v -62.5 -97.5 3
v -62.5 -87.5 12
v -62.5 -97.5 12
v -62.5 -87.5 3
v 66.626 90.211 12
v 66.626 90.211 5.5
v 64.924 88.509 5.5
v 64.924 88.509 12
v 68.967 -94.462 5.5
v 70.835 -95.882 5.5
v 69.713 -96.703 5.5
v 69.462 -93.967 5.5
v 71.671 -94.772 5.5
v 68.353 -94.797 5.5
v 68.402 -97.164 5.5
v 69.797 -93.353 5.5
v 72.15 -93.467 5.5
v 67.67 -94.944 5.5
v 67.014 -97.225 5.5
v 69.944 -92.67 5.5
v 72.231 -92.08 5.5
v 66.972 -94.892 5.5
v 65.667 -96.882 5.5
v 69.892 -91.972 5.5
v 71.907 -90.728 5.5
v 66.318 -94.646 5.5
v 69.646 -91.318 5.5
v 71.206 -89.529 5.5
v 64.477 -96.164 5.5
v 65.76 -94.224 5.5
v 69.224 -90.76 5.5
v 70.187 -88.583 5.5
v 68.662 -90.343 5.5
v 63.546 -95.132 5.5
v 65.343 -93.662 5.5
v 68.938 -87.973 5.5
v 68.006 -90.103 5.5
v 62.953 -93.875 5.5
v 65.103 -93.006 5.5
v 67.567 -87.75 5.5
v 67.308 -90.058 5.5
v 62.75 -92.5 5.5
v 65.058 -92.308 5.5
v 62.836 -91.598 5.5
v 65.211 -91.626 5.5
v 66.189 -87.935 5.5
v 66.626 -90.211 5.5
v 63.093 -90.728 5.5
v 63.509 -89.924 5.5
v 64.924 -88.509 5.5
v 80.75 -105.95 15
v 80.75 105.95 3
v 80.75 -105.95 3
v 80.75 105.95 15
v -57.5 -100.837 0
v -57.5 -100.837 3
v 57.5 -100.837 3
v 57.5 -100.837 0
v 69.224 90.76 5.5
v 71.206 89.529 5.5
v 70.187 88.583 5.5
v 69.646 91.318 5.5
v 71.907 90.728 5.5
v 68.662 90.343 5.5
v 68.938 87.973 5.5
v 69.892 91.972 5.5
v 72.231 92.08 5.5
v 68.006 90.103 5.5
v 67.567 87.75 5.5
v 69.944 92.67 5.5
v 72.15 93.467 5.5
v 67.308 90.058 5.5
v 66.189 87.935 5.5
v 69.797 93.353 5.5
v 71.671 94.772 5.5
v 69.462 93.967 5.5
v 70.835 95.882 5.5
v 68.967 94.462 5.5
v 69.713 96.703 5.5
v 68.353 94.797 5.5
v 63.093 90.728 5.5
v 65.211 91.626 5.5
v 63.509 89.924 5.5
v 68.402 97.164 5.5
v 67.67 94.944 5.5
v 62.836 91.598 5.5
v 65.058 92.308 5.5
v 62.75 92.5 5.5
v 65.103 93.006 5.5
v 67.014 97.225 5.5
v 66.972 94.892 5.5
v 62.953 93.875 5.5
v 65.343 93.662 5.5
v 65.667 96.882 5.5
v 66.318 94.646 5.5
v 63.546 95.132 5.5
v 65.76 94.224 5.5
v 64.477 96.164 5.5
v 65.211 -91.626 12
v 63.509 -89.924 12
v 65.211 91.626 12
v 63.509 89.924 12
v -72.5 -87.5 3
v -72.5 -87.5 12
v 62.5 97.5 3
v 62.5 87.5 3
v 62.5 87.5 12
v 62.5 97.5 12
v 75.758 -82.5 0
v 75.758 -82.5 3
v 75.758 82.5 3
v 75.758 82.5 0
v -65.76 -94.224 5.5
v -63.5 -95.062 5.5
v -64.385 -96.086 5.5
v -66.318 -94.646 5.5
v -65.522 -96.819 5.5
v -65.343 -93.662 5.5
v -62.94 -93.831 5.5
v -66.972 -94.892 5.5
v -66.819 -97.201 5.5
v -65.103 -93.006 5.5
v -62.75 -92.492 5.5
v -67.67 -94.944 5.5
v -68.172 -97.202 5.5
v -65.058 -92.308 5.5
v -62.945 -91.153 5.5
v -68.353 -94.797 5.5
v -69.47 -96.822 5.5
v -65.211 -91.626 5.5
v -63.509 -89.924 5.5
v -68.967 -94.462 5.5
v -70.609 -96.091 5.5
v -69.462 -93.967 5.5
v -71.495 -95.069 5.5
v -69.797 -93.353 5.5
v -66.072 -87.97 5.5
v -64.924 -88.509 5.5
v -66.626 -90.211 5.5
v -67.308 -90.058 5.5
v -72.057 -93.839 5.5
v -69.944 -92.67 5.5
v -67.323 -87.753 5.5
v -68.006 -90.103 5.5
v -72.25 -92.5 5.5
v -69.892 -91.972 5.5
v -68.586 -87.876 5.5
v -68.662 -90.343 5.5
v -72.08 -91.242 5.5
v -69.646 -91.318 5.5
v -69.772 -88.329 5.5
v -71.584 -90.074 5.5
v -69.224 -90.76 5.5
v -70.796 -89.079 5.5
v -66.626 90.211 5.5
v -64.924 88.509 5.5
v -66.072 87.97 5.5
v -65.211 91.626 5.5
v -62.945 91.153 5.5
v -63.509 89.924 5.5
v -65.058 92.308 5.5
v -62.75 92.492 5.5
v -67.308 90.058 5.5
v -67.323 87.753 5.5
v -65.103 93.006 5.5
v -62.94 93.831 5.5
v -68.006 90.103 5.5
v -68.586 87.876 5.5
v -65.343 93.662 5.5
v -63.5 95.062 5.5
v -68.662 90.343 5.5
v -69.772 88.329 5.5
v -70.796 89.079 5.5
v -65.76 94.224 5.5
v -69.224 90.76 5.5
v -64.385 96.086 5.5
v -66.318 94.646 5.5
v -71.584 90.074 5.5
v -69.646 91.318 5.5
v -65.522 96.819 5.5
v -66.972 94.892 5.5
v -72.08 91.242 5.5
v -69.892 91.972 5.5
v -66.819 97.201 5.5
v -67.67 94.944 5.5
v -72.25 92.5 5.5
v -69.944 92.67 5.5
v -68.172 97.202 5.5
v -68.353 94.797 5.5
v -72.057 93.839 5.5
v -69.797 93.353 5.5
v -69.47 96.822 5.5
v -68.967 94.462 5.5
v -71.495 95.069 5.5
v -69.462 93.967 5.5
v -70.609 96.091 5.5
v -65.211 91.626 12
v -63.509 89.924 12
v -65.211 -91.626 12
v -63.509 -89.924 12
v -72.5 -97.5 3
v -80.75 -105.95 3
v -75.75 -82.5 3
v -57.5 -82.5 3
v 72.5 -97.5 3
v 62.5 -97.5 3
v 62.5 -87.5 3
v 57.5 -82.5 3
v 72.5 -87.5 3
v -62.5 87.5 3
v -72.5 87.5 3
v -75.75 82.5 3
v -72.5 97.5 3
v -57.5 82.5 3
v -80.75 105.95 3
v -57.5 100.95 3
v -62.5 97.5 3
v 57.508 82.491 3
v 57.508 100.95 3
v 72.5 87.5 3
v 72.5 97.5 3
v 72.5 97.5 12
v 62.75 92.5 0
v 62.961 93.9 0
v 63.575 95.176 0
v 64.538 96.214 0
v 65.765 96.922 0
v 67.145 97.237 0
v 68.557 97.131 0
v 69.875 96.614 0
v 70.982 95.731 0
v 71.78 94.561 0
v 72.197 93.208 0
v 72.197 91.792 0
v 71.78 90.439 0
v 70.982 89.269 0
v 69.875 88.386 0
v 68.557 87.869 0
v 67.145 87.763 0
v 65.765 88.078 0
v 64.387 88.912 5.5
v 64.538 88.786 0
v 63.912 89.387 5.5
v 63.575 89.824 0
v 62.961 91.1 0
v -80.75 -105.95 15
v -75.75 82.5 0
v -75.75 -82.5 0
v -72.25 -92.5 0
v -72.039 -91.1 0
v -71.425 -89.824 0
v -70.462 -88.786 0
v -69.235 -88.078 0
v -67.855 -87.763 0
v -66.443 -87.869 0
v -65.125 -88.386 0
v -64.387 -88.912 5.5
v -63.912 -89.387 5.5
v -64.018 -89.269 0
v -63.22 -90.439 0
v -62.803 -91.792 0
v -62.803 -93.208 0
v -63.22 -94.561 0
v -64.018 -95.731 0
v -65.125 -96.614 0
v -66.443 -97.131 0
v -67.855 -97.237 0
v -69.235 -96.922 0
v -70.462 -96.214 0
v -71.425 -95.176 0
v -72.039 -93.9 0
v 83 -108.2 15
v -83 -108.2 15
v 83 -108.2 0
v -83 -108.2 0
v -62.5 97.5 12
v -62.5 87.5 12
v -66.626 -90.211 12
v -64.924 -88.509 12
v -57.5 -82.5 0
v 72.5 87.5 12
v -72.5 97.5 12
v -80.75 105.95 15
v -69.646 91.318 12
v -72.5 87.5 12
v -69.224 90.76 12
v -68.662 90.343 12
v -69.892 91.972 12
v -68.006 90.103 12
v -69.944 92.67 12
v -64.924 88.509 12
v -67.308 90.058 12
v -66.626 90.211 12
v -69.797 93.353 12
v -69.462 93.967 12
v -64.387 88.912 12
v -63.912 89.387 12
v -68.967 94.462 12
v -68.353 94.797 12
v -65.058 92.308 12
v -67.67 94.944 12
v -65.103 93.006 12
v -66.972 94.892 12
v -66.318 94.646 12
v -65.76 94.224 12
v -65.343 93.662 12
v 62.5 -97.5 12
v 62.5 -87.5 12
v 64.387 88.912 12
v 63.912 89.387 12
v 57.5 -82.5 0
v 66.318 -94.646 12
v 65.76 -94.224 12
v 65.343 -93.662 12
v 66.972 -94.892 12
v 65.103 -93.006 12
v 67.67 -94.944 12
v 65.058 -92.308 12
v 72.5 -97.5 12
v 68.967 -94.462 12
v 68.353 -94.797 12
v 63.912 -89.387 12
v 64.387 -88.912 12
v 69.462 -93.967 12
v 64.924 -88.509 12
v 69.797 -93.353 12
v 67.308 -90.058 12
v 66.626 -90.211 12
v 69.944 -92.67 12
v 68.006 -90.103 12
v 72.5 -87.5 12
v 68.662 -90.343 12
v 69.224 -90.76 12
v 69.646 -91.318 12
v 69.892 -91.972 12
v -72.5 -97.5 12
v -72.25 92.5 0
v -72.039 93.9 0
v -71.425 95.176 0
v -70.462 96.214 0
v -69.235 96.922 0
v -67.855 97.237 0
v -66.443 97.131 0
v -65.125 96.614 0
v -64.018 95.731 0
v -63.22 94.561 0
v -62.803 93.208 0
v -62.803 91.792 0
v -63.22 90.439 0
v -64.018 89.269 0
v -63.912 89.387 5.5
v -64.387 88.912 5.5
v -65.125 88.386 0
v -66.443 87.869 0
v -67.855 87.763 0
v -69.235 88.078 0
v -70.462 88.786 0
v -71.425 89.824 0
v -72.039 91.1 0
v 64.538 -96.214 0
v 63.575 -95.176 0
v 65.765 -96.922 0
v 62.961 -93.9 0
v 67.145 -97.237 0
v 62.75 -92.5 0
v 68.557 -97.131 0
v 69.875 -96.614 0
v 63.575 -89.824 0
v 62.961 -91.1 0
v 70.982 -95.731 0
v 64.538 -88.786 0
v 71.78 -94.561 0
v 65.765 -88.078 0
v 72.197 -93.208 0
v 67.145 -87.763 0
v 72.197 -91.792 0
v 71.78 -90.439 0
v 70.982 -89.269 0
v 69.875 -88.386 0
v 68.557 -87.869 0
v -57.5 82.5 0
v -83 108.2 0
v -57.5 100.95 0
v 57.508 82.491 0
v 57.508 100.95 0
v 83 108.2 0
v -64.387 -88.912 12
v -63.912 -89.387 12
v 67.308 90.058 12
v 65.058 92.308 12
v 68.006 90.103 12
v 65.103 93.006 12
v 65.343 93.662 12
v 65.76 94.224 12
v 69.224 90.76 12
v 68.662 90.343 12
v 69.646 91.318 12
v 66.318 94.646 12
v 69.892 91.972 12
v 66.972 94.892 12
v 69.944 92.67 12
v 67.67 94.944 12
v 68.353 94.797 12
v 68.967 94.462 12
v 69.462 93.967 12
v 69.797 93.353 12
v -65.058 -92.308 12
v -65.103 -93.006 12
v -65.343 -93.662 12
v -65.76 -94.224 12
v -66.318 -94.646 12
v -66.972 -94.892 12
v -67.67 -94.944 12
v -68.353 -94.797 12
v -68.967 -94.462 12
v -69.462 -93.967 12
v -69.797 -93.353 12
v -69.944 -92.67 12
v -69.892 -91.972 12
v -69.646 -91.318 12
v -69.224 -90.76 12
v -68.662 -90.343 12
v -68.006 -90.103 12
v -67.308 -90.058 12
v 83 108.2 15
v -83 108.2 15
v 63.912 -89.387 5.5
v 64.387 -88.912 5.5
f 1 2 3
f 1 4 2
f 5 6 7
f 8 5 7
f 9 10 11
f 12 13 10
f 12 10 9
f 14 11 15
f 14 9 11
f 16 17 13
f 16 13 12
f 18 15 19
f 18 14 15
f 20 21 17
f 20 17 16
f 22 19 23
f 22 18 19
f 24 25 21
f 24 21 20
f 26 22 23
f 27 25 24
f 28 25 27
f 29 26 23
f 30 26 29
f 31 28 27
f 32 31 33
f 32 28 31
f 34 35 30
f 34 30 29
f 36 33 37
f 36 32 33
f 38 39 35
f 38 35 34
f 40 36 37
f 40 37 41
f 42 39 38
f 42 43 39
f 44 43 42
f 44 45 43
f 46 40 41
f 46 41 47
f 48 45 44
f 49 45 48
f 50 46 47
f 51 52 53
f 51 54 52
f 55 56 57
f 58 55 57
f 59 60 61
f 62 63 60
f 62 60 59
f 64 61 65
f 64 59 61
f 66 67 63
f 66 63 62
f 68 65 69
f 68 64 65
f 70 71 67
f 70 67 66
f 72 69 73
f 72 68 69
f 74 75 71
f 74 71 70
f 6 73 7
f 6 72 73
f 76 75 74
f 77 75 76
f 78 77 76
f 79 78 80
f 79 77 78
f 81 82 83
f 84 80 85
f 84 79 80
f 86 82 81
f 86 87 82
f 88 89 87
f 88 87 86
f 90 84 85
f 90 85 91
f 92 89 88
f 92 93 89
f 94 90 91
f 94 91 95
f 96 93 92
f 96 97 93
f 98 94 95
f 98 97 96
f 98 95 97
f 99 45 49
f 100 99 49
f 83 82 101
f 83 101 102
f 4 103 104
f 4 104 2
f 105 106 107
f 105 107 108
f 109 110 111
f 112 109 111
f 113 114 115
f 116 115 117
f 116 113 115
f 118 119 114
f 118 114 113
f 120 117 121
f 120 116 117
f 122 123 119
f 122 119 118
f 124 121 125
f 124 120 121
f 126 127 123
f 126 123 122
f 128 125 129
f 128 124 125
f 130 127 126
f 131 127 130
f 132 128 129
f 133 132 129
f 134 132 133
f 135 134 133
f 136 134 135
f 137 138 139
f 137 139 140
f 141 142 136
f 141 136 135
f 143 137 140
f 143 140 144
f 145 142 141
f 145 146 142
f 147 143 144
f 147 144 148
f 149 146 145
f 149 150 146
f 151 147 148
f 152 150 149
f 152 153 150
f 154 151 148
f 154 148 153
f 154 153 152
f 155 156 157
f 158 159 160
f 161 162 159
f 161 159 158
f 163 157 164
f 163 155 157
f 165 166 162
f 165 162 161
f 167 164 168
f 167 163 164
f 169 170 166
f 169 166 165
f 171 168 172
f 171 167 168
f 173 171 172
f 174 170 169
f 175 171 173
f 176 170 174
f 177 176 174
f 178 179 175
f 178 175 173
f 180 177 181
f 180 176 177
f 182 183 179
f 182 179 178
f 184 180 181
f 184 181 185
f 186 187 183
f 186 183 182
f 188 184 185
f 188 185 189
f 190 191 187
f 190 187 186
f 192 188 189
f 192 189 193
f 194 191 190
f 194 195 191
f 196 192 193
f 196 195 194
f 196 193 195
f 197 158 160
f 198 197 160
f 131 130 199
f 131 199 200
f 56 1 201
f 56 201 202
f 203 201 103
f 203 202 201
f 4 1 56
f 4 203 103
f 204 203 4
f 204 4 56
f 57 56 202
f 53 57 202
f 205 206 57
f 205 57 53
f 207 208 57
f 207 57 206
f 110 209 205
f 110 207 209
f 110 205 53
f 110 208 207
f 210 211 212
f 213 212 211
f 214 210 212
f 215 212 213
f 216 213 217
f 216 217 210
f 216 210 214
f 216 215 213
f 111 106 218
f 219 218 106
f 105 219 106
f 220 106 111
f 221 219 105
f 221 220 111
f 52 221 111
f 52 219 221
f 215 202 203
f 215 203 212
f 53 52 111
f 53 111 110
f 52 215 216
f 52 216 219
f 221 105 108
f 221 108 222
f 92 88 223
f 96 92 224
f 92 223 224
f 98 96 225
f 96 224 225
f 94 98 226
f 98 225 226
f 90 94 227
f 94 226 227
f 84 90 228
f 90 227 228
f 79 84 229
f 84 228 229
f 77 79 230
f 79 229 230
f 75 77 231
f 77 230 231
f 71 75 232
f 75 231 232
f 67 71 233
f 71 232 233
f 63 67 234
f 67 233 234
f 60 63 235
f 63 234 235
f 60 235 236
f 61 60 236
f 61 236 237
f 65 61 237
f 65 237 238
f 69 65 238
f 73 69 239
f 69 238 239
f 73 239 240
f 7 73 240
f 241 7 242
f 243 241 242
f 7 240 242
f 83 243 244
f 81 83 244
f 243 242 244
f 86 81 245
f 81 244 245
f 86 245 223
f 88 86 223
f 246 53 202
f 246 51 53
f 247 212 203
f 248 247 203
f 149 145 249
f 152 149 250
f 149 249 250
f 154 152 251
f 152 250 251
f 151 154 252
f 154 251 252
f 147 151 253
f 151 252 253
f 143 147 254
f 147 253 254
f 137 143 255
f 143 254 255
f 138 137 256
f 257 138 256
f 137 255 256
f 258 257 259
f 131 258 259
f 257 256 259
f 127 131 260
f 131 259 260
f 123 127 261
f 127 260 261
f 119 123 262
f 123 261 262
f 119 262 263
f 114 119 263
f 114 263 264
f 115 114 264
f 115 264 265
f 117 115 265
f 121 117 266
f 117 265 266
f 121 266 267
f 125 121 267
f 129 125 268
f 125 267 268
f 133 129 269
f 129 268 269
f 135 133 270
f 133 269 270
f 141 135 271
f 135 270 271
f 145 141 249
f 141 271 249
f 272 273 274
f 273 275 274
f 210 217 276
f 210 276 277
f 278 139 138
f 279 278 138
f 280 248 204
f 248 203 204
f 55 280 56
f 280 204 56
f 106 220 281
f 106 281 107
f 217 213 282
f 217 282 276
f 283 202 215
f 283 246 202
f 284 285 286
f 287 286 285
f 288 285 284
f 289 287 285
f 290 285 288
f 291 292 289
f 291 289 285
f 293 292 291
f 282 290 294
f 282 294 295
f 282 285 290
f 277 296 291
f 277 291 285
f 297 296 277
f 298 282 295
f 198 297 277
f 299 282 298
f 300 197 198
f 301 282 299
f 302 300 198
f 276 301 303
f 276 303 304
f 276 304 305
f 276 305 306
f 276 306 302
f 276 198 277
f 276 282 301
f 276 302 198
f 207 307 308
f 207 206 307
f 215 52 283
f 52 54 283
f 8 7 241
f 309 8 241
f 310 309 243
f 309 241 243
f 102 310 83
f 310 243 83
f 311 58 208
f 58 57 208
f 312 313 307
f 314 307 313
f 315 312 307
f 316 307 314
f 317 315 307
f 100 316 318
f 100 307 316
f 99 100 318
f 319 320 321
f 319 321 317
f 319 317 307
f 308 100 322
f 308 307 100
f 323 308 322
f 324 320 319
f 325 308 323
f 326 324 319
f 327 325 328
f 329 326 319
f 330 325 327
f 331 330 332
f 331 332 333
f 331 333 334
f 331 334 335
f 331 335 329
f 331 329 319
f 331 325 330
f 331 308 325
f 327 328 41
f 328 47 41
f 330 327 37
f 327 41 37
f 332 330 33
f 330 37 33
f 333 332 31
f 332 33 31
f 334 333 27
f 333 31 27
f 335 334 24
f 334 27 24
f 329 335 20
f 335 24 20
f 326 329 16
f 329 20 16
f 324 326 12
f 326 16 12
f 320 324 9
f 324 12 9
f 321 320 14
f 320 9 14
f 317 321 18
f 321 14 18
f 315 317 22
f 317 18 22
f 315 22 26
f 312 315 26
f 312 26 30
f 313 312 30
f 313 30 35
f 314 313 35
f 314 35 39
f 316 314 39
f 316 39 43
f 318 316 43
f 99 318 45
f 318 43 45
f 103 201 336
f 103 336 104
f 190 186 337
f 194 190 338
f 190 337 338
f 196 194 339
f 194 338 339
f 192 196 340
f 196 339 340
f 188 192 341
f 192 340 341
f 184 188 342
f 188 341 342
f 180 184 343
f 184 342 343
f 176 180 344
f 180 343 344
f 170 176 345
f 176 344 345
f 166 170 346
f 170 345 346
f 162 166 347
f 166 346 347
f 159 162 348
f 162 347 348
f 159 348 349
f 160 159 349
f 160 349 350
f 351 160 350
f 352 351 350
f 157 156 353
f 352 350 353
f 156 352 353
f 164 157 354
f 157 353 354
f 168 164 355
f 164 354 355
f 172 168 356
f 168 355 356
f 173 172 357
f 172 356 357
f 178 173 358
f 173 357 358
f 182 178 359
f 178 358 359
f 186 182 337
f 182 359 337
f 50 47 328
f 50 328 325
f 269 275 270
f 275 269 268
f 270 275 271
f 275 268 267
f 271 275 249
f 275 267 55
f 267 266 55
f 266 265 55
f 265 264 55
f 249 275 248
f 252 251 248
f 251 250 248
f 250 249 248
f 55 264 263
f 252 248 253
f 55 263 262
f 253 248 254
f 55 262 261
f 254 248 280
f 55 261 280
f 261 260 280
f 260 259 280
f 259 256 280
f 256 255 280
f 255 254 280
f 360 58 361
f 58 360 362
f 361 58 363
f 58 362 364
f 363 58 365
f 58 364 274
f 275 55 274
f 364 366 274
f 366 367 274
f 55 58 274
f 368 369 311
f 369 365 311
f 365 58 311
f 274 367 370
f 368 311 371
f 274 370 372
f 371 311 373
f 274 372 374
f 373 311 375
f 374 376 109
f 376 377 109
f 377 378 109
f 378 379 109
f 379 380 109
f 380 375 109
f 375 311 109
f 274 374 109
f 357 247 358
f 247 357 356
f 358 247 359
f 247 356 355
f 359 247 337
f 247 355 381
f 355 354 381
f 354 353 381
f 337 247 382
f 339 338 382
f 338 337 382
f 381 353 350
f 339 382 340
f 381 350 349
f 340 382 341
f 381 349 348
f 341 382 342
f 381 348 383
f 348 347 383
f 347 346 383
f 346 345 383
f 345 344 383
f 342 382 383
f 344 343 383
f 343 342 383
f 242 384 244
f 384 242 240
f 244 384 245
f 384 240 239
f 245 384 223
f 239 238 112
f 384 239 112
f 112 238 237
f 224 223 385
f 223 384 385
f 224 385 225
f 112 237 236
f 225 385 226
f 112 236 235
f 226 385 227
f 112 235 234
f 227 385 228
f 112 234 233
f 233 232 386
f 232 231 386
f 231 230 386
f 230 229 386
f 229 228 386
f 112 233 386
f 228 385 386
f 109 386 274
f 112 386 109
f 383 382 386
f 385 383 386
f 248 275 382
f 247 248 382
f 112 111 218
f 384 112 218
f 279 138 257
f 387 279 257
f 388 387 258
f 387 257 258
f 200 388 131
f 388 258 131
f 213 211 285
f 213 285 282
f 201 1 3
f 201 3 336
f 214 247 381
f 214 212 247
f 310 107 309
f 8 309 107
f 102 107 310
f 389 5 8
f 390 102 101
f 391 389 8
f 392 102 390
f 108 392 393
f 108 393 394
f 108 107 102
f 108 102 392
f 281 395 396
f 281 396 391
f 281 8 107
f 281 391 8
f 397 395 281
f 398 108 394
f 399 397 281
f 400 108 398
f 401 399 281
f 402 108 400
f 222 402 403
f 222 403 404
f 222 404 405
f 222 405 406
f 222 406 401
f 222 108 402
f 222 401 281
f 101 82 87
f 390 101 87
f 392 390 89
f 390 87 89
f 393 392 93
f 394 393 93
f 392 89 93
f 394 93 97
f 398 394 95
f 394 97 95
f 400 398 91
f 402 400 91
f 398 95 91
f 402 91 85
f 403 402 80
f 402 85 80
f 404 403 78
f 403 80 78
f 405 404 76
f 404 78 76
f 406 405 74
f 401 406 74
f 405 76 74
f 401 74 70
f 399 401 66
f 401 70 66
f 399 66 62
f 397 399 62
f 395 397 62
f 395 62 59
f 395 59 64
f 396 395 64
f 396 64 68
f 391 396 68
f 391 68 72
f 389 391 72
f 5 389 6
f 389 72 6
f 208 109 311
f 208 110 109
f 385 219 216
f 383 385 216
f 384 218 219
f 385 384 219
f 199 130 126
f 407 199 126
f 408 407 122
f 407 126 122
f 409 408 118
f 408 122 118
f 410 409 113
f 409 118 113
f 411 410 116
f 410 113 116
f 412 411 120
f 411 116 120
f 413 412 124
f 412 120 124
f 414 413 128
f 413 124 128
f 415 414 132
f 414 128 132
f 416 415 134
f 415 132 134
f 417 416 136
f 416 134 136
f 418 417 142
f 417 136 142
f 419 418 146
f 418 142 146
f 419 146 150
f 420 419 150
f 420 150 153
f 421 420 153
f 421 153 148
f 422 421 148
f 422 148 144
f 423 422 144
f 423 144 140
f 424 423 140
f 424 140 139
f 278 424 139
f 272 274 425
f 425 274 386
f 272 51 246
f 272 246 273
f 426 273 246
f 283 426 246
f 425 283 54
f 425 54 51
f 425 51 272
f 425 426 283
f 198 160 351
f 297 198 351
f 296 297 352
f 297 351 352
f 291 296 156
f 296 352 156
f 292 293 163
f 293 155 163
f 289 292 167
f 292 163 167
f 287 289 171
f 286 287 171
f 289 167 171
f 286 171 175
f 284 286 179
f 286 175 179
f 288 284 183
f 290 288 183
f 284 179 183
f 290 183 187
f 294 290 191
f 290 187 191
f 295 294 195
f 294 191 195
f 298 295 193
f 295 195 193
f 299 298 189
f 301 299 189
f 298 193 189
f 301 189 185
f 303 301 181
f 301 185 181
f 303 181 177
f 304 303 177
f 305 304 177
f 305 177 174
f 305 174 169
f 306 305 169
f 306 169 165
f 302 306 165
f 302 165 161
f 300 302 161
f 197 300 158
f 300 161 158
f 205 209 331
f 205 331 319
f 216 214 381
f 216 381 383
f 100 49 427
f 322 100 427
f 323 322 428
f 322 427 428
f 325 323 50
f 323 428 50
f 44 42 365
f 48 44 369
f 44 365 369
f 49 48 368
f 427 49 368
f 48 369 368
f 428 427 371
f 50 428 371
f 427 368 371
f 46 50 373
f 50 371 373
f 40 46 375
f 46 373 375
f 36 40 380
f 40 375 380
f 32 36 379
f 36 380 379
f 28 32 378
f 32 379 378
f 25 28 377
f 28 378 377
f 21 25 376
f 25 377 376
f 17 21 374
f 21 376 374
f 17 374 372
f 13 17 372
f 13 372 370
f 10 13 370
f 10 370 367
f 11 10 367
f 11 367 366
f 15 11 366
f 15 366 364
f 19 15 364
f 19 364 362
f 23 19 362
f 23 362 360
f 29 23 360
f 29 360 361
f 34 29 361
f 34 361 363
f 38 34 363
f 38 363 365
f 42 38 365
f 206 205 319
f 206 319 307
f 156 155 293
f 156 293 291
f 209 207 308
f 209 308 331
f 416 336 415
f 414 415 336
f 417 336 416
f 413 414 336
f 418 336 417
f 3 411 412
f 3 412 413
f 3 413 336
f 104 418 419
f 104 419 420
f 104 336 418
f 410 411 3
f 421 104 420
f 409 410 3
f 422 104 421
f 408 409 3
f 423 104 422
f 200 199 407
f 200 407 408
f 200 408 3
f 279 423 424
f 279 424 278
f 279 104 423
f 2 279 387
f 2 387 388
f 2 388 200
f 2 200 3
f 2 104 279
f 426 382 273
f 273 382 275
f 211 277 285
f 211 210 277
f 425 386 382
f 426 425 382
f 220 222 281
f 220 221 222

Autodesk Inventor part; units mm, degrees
ref_plane "YZ Plane" through (0, 0, 0) normal (1, 0, 0) x (0, 1, 0)
ref_plane "XZ Plane" through (0, 0, 0) normal (0, 1, 0) x (-1, 0, 0)
ref_plane "XY Plane" through (0, 0, 0) normal (0, 0, 1) x (1, 0, 0)
sketch "Boceto1" plane through (0, 0, 0) normal (0, 0, 1) x (1, 0, 0)
  line L0 (-83, -108.2) -> (83, -108.2)
  line L1 (83, -108.2) -> (83, 108.2)
  line L2 (83, 108.2) -> (-83, 108.2)
  line L3 (-83, 108.2) -> (-83, -108.2)
  line L4 (-83, -108.2) -> (83, 108.2) construction
  line L5 (83, -108.2) -> (-83, 108.2) construction
  point P0 (0, 0)
  dimension "d0" = 166
  dimension "d1" = 216.4
extrude "Extrusión1" add sketch "Boceto1" along normal blind 15
sketch "Boceto2" plane through (0, 0, 15) normal (0, 0, 1) x (1, 0, 0)
  line L0 (80.75, -105.95) -> (-80.75, -105.95)
  line L1 (-80.75, -105.95) -> (-80.75, 105.95)
  line L2 (80.75, 105.95) -> (-80.75, 105.95)
  line L3 (80.75, 105.95) -> (80.75, -105.95)
  line L4 (-83, 108.2) -> (83, 108.2)
  line L5 (83, 108.2) -> (83, -108.2)
  line L6 (83, -108.2) -> (-83, -108.2)
  line L7 (-83, -108.2) -> (-83, 108.2)
  point P0 (0, 0)
extrude "Extrusión2" cut sketch "Boceto2" against normal blind 12 contours L0 L1 L2 L3
sketch "Boceto3" plane through (0, 0, 3) normal (0, 0, 1) x (1, 0, 0)
  line L0 (-67.5, -92.5) -> (67.5, -92.5)
  line L1 (67.5, -92.5) -> (67.5, 92.5)
  line L2 (67.5, 92.5) -> (-67.5, 92.5)
  line L3 (-67.5, 92.5) -> (-67.5, -92.5)
  line L4 (-62.5, 87.5) -> (-72.5, 87.5)
  line L5 (-72.5, 87.5) -> (-72.5, 97.5)
  line L6 (-72.5, 97.5) -> (-62.5, 97.5)
  line L7 (-62.5, 97.5) -> (-62.5, 87.5)
  line L8 (-62.5, 87.5) -> (-72.5, 97.5) construction
  line L9 (-72.5, 87.5) -> (-62.5, 97.5) construction
  line L10 (72.5, 87.5) -> (62.5, 87.5)
  line L11 (62.5, 87.5) -> (62.5, 97.5)
  line L12 (62.5, 97.5) -> (72.5, 97.5)
  line L13 (72.5, 97.5) -> (72.5, 87.5)
  line L14 (72.5, 87.5) -> (62.5, 97.5) construction
  line L15 (62.5, 87.5) -> (72.5, 97.5) construction
  line L16 (72.5, -97.5) -> (62.5, -97.5)
  line L17 (62.5, -97.5) -> (62.5, -87.5)
  line L18 (62.5, -87.5) -> (72.5, -87.5)
  line L19 (72.5, -87.5) -> (72.5, -97.5)
  line L20 (72.5, -97.5) -> (62.5, -87.5) construction
  line L21 (62.5, -97.5) -> (72.5, -87.5) construction
  line L22 (-62.5, -97.5) -> (-72.5, -97.5)
  line L23 (-72.5, -97.5) -> (-72.5, -87.5)
  line L24 (-72.5, -87.5) -> (-62.5, -87.5)
  line L25 (-62.5, -87.5) -> (-62.5, -97.5)
  line L26 (-62.5, -97.5) -> (-72.5, -87.5) construction
  line L27 (-72.5, -97.5) -> (-62.5, -87.5) construction
  point P0 (0, 0)
  dimension "d12" = 135
  dimension "d13" = 185
  dimension "d14" = 10
  dimension "d15" = 10
  dimension "d16" = 10
  dimension "d17" = 10
  dimension "d18" = 10
  dimension "d19" = 10
  dimension "d20" = 10
  dimension "d21" = 10
extrude "Extrusión3" add sketch "Boceto3" along normal blind 9 contours L3 L24 L25 L0 | L0 L25 L22 L23 L24 L3 | L17 L18 L1 L0 | L0 L1 L18 L19 L16 L17 | L4 L5 L6 L7 L2 L3 | L3 L2 L7 L4 | L10 L11 L2 L1 | L1 L2 L11 L12 L13 L10
sketch "Boceto4" plane through (0, 0, 0) normal (0, 0, -1) x (-1, 0, 0)
  line L0 (72.5, -97.5) -> (72.5, -87.5) projected
  line L1 (72.5, -87.5) -> (62.5, -87.5) projected
  line L2 (62.5, -87.5) -> (62.5, -97.5) projected
  line L3 (62.5, -97.5) -> (72.5, -97.5) projected
  line L4 (-62.5, 87.5) -> (-62.5, 97.5) projected
  line L5 (-62.5, 97.5) -> (-72.5, 97.5) projected
  line L6 (-72.5, 97.5) -> (-72.5, 87.5) projected
  line L7 (-72.5, 87.5) -> (-62.5, 87.5) projected
  line L8 (72.5, 87.5) -> (72.5, 97.5) projected
  line L9 (72.5, 97.5) -> (62.5, 97.5) projected
  line L10 (62.5, 97.5) -> (62.5, 87.5) projected
  line L11 (62.5, 87.5) -> (72.5, 87.5) projected
  line L12 (-62.5, -97.5) -> (-62.5, -87.5) projected
  line L13 (-62.5, -87.5) -> (-72.5, -87.5) projected
  line L14 (-72.5, -87.5) -> (-72.5, -97.5) projected
  line L15 (-72.5, -97.5) -> (-62.5, -97.5) projected
  line L16 (80.75, -105.95) -> (80.75, 105.95) projected
  line L17 (-80.75, -105.95) -> (80.75, -105.95) projected
  line L18 (-80.75, 105.95) -> (-80.75, -105.95) projected
  line L19 (80.75, 105.95) -> (-80.75, 105.95) projected
  line L20 (-67.5, -92.5) -> (-67.5, 92.5) projected
  line L21 (67.5, 92.5) -> (67.5, -92.5) projected
  line L22 (-67.5, 92.5) -> (67.5, 92.5) projected
  line L23 (67.5, -92.5) -> (-67.5, -92.5) projected
  circle A0 centre (-67.5, 92.5) radius 4.75
  circle A1 centre (67.5, 92.5) radius 4.75
  circle A2 centre (67.5, -92.5) radius 4.75
  circle A3 centre (-67.5, -92.5) radius 4.75
  point P0 (0, 0)
  dimension "d24" = 9.5
  dimension "d25" = 9.5
  dimension "d26" = 9.5
  dimension "d27" = 9.5
extrude "Extrusión4" cut sketch "Boceto4" against normal blind 5.5 contours A2 L23 L21 | L21 L23 A2 | A1 L22 L21 | L21 L22 A1 | A3 L20 L23 | L23 L20 A3 | A0 L20 L22 | L22 L20 A0
sketch "Boceto5" plane through (67.5, 92.5, 5.5) normal (0, 0, -1) x (-1, 0, 0)
  arc A0 (2.2886, -0.8744) -> (0.8744, -2.2886) centre (0, 0) ccw
  line L0 (0, 0) -> (4.75, 0) construction
  line L1 (1.6679, -3.0821) -> (2.5764, -3.9906)
  line L2 (1.6679, -3.0821) -> (0.8744, -2.2886)
  line L3 (2.2886, -0.8744) -> (3.9906, -2.5764)
  arc A1 (2.5764, -3.9906) -> (3.9906, -2.5764) centre (0, 0) ccw
  line L4 (135, -185) -> (0, -185)
  arc A2 (134.1256, -2.2886) -> (132.7114, -0.8744) centre (135, 0) ccw
  line L5 (131.9179, -1.6679) -> (131.0094, -2.5764)
  line L6 (131.9179, -1.6679) -> (132.7114, -0.8744)
  line L7 (134.1256, -2.2886) -> (132.4236, -3.9906)
  arc A3 (131.0094, -2.5764) -> (132.4236, -3.9906) centre (135, 0) ccw
  arc A4 (132.7114, -184.1256) -> (134.1256, -182.7114) centre (135, -185) ccw
  line L8 (133.3321, -181.9179) -> (132.4236, -181.0094)
  line L9 (133.3321, -181.9179) -> (134.1256, -182.7114)
  line L10 (132.7114, -184.1256) -> (131.0094, -182.4236)
  arc A5 (132.4236, -181.0094) -> (131.0094, -182.4236) centre (135, -185) ccw
  arc A6 (0.8744, -182.7114) -> (2.2886, -184.1256) centre (0, -185) ccw
  line L11 (3.0821, -183.3321) -> (3.9906, -182.4236)
  line L12 (3.0821, -183.3321) -> (2.2886, -184.1256)
  line L13 (0.8744, -182.7114) -> (2.5764, -181.0094)
  arc A7 (3.9906, -182.4236) -> (2.5764, -181.0094) centre (0, -185) ccw
  point P0 (67.5, -92.5)
  dimension "d30" = 4.9
  dimension "d36" = 4.9
  dimension "d37" = 4.9
  dimension "d38" = 4.9
extrude "Extrusión5" cut sketch "Boceto5" against normal blind 10
sketch "Boceto6" plane through (0, 0, 3) normal (0, 0, 1) x (1, 0, 0)
  line L0 (62.5, -87.5) -> (62.5, -97.5) projected
  line L1 (72.5, -87.5) -> (62.5, -87.5) projected
  line L2 (-62.5, -97.5) -> (-62.5, -87.5) projected
  line L3 (-57.5, -97.5) -> (-57.5, -100.837)
  line L4 (-57.5, -100.837) -> (57.5, -100.837)
  line L5 (57.5, -100.837) -> (57.5, -82.5)
  line L6 (75.7581, -82.5) -> (57.5, -82.5)
  line L7 (-57.5, -100.837) -> (-57.5, -82.5)
  line L8 (-80.75, -105.95) -> (-80.75, 105.95) projected
  line L9 (75.7581, 82.5) -> (57.5081, 82.4907)
  line L10 (-80.75, 105.95) -> (80.75, 105.95) projected
  line L11 (57.5081, 105.95) -> (57.5081, 105.95)
  line L12 (57.5, -105.837) -> (57.5, -105.95)
  arc A0 (57.5, -105.837) -> (62.5, -100.837) centre (57.5, -100.837) ccw
  line L13 (62.5, -100.837) -> (62.5, -87.5)
  line L14 (72.5, -82.5) -> (75.7581, -82.5)
  line L15 (62.5, -87.5) -> (75.75, -87.5)
  line L16 (75.7581, -82.5) -> (75.7581, 82.5)
  arc A1 (75.8451, -87.4992) -> (80.7581, -82.5) centre (75.7581, -82.5) ccw
  arc A2 (80.7581, 82.5082) -> (75.75, 87.5) centre (75.7581, 82.5) ccw
  line L17 (62.5, 87.5) -> (72.5, 87.5) projected
  line L18 (75.75, 87.5) -> (62.5, 87.5)
  line L19 (62.5, 87.5) -> (62.5, 101.2352)
  line L20 (62.5, 97.5) -> (62.5, 87.5) projected
  arc A3 (62.5, 101.2352) -> (57.5081, 105.95) centre (57.5081, 100.95) ccw
  line L21 (57.5081, 82.4907) -> (57.5081, 100.95)
  line L22 (57.5081, 105.95) -> (57.5081, 105.95)
  arc A4 (-57.5, 105.95) -> (-62.5, 100.95) centre (-57.5, 100.95) ccw
  line L23 (-62.5, 87.5) -> (-62.5, 97.5) projected
  line L24 (-62.5, 100.95) -> (-62.5, 87.5)
  line L25 (-72.5, 97.5) -> (-72.5, 87.5) projected
  line L26 (-57.5, 82.5) -> (-57.5, 100.95)
  line L27 (-75.75, 82.5) -> (-75.75, -82.5)
  arc A5 (-75.75, 87.5) -> (-80.75, 82.5) centre (-75.75, 82.5) ccw
  line L28 (-75.75, 82.5) -> (-57.5, 82.5)
  line L29 (-62.5, 87.5) -> (-75.75, 87.5)
  line L30 (-62.5, -87.5) -> (-72.5, -87.5) projected
  arc A6 (-80.75, -82.5) -> (-75.75, -87.5) centre (-75.75, -82.5) ccw
  arc A7 (-62.5, -100.837) -> (-57.5, -105.837) centre (-57.5, -100.837) ccw
  line L31 (-75.75, -87.5) -> (-62.5, -87.5)
  line L32 (-62.5, -100.837) -> (-62.5, -87.5)
  line L33 (57.5, -105.837) -> (-57.5, -105.837)
  line L34 (80.75, -105.95) -> (-80.75, -105.95) projected
  line L35 (-80.75, -82.5) -> (-80.75, 82.5)
  line L36 (-57.5, 105.95) -> (57.5081, 105.95)
  line L37 (80.7581, 82.5082) -> (80.7581, -82.5)
  line L38 (-75.75, -82.5) -> (-57.5, -82.5)
  line L39 (57.5081, 100.95) -> (-57.5, 100.95)
  point P0 (0, 0)
  dimension "d52" = 5
extrude "Extrusión6" cut sketch "Boceto6" against normal blind 10 contours L7 L38 L27 L28 L26 L39 L21 L9 L16 L6 L5 L4 L3
properties part number "TestTapa_v0"
